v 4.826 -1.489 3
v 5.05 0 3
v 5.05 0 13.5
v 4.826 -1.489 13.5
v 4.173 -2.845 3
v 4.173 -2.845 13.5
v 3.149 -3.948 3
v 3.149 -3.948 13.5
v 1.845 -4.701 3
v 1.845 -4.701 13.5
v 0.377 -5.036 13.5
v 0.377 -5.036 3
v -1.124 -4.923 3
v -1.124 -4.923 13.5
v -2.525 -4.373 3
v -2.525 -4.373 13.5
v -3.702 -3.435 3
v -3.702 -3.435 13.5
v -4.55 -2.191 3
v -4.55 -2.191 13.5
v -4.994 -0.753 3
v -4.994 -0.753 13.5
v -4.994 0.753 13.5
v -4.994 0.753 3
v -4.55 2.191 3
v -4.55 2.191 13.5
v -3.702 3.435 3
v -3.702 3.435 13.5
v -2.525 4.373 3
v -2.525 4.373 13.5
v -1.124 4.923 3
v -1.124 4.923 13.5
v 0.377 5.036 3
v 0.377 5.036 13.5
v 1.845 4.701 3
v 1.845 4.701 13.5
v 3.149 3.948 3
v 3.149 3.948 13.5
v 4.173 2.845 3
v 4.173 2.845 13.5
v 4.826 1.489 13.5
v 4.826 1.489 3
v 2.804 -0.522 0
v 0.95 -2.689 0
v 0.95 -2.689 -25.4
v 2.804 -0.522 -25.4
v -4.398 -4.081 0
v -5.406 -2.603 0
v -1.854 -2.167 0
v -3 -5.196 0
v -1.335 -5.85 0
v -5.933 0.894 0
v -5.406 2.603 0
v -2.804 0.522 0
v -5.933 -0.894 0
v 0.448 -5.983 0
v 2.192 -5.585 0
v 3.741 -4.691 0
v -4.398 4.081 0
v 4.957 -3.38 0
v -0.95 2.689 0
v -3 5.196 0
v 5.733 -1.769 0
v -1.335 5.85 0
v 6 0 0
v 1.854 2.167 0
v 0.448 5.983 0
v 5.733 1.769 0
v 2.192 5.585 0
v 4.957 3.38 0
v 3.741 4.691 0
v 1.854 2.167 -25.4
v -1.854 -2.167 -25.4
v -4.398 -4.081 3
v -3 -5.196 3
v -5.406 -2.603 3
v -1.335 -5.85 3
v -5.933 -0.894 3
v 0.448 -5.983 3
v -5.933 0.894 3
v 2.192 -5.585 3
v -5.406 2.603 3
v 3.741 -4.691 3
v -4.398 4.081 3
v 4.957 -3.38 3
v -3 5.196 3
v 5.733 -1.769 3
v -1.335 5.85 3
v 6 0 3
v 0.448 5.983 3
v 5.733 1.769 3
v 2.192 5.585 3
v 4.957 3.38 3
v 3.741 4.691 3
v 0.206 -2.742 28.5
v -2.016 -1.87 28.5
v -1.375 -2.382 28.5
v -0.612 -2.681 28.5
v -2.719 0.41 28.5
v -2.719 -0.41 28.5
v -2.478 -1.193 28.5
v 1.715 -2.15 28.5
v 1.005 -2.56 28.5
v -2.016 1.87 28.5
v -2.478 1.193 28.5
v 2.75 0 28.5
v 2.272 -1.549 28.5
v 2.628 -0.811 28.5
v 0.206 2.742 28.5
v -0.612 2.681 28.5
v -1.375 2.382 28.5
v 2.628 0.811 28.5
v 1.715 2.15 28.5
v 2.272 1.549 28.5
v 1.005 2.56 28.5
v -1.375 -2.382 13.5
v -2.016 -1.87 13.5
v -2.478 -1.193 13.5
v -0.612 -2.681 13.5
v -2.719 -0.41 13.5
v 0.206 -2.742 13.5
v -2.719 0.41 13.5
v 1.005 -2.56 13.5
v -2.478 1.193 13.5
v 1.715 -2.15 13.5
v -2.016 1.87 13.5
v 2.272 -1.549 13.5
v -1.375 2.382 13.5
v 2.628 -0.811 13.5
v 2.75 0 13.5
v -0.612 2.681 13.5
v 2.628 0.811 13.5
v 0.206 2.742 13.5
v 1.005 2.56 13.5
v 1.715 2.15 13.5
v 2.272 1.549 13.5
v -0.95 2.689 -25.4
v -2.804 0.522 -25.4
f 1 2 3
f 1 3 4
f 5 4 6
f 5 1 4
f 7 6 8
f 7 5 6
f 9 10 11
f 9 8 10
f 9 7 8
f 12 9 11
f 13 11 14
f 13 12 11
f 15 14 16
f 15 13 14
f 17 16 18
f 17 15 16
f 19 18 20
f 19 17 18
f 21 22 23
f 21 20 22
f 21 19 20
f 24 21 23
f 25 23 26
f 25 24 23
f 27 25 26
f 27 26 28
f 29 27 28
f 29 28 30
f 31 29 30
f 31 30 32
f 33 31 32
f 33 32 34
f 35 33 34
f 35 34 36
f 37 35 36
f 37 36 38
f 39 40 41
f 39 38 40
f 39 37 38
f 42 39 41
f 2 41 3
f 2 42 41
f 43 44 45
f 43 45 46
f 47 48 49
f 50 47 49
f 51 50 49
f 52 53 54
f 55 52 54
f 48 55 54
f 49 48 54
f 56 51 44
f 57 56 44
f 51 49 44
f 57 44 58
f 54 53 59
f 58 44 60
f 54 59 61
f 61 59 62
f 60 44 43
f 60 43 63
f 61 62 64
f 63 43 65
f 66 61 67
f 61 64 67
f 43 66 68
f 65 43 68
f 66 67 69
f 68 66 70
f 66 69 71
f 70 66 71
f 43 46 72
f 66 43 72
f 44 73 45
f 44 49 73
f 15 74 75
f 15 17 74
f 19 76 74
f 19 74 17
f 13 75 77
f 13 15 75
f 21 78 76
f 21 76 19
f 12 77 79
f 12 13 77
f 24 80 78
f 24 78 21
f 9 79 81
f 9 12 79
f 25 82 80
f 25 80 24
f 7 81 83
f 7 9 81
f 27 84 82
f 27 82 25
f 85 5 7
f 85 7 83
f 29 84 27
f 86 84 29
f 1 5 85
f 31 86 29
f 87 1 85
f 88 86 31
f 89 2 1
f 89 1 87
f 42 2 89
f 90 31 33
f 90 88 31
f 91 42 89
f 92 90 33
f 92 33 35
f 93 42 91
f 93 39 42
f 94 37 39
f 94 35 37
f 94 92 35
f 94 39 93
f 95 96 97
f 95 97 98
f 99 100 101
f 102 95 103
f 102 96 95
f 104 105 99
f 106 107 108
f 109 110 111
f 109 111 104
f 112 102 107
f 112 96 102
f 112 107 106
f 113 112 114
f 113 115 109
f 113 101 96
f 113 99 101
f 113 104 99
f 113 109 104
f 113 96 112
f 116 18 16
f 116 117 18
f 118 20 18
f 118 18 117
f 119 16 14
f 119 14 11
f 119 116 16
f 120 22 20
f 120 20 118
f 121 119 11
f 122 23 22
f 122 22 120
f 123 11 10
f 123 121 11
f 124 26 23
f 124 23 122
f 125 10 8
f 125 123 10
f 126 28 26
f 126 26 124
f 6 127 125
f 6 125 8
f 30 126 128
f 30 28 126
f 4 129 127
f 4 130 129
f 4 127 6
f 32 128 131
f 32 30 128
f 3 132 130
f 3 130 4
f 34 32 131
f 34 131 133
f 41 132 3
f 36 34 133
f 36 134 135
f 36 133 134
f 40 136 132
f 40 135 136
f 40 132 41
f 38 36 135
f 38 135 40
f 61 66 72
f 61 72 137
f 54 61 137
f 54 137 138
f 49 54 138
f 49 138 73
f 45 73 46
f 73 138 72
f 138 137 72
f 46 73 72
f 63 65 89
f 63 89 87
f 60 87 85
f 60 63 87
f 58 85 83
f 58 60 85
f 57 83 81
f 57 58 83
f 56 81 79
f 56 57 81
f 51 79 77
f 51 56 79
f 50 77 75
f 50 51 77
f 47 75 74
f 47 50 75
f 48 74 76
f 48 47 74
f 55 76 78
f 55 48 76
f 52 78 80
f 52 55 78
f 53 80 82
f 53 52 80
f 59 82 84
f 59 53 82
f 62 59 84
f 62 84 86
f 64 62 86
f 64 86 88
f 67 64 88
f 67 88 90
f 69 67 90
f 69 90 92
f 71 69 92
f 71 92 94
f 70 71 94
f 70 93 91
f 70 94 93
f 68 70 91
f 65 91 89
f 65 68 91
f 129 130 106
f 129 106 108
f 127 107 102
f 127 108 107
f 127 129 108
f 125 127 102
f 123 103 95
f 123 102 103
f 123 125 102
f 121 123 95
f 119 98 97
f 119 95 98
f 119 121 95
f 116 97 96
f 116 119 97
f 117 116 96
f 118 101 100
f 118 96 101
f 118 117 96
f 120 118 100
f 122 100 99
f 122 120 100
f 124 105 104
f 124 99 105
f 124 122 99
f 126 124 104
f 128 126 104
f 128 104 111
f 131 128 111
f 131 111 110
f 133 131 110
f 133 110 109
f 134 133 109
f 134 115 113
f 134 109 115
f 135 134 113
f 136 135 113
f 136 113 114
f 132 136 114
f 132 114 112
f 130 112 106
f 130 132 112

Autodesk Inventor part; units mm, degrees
ref_plane "YZ Plane" through (0, 0, 0) normal (1, 0, 0) x (0, 1, 0)
ref_plane "XZ Plane" through (0, 0, 0) normal (0, 1, 0) x (-1, 0, 0)
ref_plane "XY Plane" through (0, 0, 0) normal (0, 0, 1) x (1, 0, 0)
sketch "Sketch1" plane through (0, 0, 0) normal (0, 0, 1) x (1, 0, 0)
  circle A0 centre (0, 0) radius 4.5 construction
  line L0 (-1.8766, -2.1935) -> (-2.838, 0.5284) construction
  line L1 (-2.838, 0.5284) -> (-0.9614, 2.722) construction
  line L2 (-0.9614, 2.722) -> (1.8766, 2.1935) construction
  line L3 (1.8766, 2.1935) -> (2.838, -0.5284) construction
  line L4 (2.838, -0.5284) -> (0.9614, -2.722) construction
  line L5 (0.9614, -2.722) -> (-1.8766, -2.1935) construction
  line L6 (-0.9498, 2.6893) -> (-2.8039, 0.5221)
  line L7 (-2.8039, 0.5221) -> (-1.8541, -2.1672)
  line L8 (-1.8541, -2.1672) -> (0.9498, -2.6893)
  line L9 (0.9498, -2.6893) -> (2.8039, -0.5221)
  line L10 (2.8039, -0.5221) -> (1.8541, 2.1672)
  line L11 (1.8541, 2.1672) -> (-0.9498, 2.6893)
  dimension "d0" = 0.03
extrude "Extrusion1" add sketch "Sketch1" against normal blind 25.4
sketch "Sketch2" plane through (0, 0, 0) normal (0, 0, 1) x (1, 0, 0)
  circle A0 centre (0, 0) radius 6
  dimension "d3" = 12
extrude "Extrusion2" add sketch "Sketch2" along normal blind 3
sketch "Sketch4" plane through (0, 0, 3) normal (0, 0, 1) x (1, 0, 0)
  circle A0 centre (0, 0) radius 5.08 construction
  circle A1 centre (0, 8) radius 1.48 construction
  circle A2 centre (6.9282, 4) radius 1.48 construction
  circle A3 centre (6.9282, -4) radius 1.48 construction
  circle A4 centre (0, -8) radius 1.48 construction
  circle A5 centre (-6.9282, -4) radius 1.48 construction
  circle A6 centre (-6.9282, 4) radius 1.48 construction
  circle A7 centre (0, 0) radius 5.05
  circle A8 centre (0, 0) radius 12.7 projected
  point P0 (0, 0)
  dimension "d7" = 0.03
extrude "Extrusion3" add sketch "Sketch4" along normal blind 10.5 contours A7
sketch "Sketch5" plane through (0, 0, 13.5) normal (0, 0, 1) x (1, 0, 0)
  circle A0 centre (0, 0) radius 2.75
  point P0 (0, 0)
  dimension "d10" = 5.5
extrude "Extrusion4" add sketch "Sketch5" along normal blind 15
properties part number "Shaft"
